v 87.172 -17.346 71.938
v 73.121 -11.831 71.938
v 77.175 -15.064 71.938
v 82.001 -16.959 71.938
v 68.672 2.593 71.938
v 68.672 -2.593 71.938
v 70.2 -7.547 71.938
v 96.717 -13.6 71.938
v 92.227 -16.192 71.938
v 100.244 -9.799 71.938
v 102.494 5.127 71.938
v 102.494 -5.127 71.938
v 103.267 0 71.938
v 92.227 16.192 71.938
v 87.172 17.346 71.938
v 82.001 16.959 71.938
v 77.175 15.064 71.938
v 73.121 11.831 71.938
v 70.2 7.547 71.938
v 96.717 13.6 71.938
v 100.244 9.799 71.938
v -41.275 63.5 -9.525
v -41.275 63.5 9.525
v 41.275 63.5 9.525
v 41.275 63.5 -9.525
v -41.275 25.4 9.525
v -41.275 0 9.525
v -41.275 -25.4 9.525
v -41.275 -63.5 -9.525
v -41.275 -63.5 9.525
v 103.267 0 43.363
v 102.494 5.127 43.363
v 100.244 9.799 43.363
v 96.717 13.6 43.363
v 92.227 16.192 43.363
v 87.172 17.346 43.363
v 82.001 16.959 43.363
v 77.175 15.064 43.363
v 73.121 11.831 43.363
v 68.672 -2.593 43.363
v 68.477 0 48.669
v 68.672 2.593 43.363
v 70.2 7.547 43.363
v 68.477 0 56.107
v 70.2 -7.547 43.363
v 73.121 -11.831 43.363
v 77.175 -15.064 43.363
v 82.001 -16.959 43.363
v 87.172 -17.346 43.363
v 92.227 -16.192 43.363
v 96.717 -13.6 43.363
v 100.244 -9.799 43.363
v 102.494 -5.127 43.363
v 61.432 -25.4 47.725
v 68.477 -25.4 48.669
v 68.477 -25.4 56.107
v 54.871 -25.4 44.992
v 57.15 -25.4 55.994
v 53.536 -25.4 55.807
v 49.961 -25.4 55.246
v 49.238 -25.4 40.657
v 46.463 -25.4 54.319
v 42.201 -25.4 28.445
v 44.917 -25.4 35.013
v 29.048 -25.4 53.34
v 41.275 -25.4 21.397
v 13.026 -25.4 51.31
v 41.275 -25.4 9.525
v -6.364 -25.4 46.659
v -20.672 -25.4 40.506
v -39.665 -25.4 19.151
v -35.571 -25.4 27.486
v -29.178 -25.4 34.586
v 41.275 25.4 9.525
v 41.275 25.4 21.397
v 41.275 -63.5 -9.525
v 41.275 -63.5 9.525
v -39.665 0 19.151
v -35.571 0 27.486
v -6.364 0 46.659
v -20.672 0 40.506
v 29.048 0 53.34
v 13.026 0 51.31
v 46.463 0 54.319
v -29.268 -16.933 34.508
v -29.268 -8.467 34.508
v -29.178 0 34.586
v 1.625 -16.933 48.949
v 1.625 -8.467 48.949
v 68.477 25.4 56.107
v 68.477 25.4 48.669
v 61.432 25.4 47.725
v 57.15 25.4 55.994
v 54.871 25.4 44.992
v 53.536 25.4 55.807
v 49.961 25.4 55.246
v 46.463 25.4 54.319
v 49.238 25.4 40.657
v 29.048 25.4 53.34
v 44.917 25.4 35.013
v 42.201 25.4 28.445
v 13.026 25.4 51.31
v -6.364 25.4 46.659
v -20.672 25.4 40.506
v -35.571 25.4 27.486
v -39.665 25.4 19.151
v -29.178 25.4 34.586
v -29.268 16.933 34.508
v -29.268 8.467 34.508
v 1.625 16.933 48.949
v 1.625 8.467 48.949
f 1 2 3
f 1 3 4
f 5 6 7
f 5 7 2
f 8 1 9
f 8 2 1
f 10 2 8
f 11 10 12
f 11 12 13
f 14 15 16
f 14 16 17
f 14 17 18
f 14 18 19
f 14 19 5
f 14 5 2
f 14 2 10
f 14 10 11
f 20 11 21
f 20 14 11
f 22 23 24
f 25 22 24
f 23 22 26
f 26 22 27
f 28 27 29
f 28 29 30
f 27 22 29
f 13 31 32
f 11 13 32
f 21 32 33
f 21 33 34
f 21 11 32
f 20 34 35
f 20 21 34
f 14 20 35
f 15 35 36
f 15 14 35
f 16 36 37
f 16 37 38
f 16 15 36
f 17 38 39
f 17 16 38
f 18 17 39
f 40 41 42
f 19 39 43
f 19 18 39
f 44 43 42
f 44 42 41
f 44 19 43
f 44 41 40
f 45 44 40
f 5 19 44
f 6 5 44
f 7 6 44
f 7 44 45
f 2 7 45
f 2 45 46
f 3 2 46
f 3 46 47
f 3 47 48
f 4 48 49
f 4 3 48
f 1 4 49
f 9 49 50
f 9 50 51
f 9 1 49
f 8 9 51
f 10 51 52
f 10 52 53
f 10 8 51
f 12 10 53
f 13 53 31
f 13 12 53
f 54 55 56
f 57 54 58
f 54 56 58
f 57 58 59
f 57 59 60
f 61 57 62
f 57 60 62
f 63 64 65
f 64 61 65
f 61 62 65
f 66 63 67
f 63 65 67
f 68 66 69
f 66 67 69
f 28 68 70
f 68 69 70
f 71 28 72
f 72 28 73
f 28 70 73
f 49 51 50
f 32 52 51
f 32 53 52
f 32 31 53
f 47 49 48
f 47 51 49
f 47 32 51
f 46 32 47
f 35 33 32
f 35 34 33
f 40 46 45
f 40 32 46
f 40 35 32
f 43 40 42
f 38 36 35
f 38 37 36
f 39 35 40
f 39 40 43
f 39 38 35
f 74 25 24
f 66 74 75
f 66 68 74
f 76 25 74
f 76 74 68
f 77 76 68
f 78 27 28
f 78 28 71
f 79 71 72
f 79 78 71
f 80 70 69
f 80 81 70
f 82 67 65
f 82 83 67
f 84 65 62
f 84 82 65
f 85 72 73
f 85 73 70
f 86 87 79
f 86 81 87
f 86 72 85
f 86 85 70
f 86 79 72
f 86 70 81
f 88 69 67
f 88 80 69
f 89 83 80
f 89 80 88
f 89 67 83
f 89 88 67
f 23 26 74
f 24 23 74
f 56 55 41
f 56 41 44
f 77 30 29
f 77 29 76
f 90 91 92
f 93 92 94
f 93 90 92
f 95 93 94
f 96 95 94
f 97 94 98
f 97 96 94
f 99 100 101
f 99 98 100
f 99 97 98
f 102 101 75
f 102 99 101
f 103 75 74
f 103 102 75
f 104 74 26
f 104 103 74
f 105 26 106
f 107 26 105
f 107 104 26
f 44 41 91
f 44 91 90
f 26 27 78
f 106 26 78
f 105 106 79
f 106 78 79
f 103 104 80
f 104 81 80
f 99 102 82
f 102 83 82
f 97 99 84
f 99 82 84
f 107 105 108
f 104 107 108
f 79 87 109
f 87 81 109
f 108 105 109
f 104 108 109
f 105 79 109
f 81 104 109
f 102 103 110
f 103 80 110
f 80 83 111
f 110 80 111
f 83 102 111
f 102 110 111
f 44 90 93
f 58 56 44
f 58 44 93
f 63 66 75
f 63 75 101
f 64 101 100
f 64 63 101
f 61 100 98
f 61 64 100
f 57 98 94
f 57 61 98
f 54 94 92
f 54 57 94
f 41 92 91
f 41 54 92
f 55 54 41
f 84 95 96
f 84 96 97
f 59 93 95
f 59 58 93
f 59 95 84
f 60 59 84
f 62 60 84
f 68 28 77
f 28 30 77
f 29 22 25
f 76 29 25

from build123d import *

# Parameters (mm, degrees)
F0_W     = 82.55
F0_H     = 19.05
F1_DEPTH = 63.5
F2_DEPTH = 25.4


# Not quite as in the source:
# - a feature names something its author has since deleted; it is built from what else it names


with BuildPart() as f1:
    # F0 (on Front) → F1 (new body, symmetric)
    with BuildSketch(Plane.XZ):
        Rectangle(F0_W, F0_H)
    extrude(amount=F1_DEPTH, both=True)

    # F0 (on Front) → F2 (join, symmetric)
    with BuildSketch(Plane.XZ):
        with BuildLine():
            add(Edge.make_bspline(
                [(-41.275, 9.525), (-40.358517319, 40.2696579695), (-3.6993576345, 52.9938253489), (46.4628638043, 54.3190308219)],
                knots=[0, 0, 0, 0, 98.5111056796, 98.5111056796, 98.5111056796, 98.5111056796], degree=3))
            Line((-41.275, 9.525), (41.275, 9.525))
            Line((41.275, 9.525), (41.275, 21.3973916233))
            ThreePointArc((41.275, 21.3973916233), (49.2381780267, 40.6567058334), (68.4772506356, 48.6686639759))
            Line((68.4772506356, 48.6686639759), (68.4772506356, 56.1067202576))
            Line((68.4772506356, 56.1067202576), (57.15, 55.9943579674))
            ThreePointArc((57.15, 55.9943579674), (51.741173854, 55.5729842221), (46.4628638043, 54.3190308219))
        make_face()
    extrude(amount=F2_DEPTH, both=True)

    # F0 (on Front) → F3 (revolve)
    with BuildSketch(Plane.XZ):
        Polygon((85.8719348907, 55.5244293195), (85.8719348907, 43.363083154), (103.2666191459, 43.363083154), (103.2666191459, 71.938083154), (85.8719348907, 71.938083154), align=None)
    revolve(axis=Axis((85.8719348907, 0, 57.650583154), (0, 0, 1)))


solid = f1.part
